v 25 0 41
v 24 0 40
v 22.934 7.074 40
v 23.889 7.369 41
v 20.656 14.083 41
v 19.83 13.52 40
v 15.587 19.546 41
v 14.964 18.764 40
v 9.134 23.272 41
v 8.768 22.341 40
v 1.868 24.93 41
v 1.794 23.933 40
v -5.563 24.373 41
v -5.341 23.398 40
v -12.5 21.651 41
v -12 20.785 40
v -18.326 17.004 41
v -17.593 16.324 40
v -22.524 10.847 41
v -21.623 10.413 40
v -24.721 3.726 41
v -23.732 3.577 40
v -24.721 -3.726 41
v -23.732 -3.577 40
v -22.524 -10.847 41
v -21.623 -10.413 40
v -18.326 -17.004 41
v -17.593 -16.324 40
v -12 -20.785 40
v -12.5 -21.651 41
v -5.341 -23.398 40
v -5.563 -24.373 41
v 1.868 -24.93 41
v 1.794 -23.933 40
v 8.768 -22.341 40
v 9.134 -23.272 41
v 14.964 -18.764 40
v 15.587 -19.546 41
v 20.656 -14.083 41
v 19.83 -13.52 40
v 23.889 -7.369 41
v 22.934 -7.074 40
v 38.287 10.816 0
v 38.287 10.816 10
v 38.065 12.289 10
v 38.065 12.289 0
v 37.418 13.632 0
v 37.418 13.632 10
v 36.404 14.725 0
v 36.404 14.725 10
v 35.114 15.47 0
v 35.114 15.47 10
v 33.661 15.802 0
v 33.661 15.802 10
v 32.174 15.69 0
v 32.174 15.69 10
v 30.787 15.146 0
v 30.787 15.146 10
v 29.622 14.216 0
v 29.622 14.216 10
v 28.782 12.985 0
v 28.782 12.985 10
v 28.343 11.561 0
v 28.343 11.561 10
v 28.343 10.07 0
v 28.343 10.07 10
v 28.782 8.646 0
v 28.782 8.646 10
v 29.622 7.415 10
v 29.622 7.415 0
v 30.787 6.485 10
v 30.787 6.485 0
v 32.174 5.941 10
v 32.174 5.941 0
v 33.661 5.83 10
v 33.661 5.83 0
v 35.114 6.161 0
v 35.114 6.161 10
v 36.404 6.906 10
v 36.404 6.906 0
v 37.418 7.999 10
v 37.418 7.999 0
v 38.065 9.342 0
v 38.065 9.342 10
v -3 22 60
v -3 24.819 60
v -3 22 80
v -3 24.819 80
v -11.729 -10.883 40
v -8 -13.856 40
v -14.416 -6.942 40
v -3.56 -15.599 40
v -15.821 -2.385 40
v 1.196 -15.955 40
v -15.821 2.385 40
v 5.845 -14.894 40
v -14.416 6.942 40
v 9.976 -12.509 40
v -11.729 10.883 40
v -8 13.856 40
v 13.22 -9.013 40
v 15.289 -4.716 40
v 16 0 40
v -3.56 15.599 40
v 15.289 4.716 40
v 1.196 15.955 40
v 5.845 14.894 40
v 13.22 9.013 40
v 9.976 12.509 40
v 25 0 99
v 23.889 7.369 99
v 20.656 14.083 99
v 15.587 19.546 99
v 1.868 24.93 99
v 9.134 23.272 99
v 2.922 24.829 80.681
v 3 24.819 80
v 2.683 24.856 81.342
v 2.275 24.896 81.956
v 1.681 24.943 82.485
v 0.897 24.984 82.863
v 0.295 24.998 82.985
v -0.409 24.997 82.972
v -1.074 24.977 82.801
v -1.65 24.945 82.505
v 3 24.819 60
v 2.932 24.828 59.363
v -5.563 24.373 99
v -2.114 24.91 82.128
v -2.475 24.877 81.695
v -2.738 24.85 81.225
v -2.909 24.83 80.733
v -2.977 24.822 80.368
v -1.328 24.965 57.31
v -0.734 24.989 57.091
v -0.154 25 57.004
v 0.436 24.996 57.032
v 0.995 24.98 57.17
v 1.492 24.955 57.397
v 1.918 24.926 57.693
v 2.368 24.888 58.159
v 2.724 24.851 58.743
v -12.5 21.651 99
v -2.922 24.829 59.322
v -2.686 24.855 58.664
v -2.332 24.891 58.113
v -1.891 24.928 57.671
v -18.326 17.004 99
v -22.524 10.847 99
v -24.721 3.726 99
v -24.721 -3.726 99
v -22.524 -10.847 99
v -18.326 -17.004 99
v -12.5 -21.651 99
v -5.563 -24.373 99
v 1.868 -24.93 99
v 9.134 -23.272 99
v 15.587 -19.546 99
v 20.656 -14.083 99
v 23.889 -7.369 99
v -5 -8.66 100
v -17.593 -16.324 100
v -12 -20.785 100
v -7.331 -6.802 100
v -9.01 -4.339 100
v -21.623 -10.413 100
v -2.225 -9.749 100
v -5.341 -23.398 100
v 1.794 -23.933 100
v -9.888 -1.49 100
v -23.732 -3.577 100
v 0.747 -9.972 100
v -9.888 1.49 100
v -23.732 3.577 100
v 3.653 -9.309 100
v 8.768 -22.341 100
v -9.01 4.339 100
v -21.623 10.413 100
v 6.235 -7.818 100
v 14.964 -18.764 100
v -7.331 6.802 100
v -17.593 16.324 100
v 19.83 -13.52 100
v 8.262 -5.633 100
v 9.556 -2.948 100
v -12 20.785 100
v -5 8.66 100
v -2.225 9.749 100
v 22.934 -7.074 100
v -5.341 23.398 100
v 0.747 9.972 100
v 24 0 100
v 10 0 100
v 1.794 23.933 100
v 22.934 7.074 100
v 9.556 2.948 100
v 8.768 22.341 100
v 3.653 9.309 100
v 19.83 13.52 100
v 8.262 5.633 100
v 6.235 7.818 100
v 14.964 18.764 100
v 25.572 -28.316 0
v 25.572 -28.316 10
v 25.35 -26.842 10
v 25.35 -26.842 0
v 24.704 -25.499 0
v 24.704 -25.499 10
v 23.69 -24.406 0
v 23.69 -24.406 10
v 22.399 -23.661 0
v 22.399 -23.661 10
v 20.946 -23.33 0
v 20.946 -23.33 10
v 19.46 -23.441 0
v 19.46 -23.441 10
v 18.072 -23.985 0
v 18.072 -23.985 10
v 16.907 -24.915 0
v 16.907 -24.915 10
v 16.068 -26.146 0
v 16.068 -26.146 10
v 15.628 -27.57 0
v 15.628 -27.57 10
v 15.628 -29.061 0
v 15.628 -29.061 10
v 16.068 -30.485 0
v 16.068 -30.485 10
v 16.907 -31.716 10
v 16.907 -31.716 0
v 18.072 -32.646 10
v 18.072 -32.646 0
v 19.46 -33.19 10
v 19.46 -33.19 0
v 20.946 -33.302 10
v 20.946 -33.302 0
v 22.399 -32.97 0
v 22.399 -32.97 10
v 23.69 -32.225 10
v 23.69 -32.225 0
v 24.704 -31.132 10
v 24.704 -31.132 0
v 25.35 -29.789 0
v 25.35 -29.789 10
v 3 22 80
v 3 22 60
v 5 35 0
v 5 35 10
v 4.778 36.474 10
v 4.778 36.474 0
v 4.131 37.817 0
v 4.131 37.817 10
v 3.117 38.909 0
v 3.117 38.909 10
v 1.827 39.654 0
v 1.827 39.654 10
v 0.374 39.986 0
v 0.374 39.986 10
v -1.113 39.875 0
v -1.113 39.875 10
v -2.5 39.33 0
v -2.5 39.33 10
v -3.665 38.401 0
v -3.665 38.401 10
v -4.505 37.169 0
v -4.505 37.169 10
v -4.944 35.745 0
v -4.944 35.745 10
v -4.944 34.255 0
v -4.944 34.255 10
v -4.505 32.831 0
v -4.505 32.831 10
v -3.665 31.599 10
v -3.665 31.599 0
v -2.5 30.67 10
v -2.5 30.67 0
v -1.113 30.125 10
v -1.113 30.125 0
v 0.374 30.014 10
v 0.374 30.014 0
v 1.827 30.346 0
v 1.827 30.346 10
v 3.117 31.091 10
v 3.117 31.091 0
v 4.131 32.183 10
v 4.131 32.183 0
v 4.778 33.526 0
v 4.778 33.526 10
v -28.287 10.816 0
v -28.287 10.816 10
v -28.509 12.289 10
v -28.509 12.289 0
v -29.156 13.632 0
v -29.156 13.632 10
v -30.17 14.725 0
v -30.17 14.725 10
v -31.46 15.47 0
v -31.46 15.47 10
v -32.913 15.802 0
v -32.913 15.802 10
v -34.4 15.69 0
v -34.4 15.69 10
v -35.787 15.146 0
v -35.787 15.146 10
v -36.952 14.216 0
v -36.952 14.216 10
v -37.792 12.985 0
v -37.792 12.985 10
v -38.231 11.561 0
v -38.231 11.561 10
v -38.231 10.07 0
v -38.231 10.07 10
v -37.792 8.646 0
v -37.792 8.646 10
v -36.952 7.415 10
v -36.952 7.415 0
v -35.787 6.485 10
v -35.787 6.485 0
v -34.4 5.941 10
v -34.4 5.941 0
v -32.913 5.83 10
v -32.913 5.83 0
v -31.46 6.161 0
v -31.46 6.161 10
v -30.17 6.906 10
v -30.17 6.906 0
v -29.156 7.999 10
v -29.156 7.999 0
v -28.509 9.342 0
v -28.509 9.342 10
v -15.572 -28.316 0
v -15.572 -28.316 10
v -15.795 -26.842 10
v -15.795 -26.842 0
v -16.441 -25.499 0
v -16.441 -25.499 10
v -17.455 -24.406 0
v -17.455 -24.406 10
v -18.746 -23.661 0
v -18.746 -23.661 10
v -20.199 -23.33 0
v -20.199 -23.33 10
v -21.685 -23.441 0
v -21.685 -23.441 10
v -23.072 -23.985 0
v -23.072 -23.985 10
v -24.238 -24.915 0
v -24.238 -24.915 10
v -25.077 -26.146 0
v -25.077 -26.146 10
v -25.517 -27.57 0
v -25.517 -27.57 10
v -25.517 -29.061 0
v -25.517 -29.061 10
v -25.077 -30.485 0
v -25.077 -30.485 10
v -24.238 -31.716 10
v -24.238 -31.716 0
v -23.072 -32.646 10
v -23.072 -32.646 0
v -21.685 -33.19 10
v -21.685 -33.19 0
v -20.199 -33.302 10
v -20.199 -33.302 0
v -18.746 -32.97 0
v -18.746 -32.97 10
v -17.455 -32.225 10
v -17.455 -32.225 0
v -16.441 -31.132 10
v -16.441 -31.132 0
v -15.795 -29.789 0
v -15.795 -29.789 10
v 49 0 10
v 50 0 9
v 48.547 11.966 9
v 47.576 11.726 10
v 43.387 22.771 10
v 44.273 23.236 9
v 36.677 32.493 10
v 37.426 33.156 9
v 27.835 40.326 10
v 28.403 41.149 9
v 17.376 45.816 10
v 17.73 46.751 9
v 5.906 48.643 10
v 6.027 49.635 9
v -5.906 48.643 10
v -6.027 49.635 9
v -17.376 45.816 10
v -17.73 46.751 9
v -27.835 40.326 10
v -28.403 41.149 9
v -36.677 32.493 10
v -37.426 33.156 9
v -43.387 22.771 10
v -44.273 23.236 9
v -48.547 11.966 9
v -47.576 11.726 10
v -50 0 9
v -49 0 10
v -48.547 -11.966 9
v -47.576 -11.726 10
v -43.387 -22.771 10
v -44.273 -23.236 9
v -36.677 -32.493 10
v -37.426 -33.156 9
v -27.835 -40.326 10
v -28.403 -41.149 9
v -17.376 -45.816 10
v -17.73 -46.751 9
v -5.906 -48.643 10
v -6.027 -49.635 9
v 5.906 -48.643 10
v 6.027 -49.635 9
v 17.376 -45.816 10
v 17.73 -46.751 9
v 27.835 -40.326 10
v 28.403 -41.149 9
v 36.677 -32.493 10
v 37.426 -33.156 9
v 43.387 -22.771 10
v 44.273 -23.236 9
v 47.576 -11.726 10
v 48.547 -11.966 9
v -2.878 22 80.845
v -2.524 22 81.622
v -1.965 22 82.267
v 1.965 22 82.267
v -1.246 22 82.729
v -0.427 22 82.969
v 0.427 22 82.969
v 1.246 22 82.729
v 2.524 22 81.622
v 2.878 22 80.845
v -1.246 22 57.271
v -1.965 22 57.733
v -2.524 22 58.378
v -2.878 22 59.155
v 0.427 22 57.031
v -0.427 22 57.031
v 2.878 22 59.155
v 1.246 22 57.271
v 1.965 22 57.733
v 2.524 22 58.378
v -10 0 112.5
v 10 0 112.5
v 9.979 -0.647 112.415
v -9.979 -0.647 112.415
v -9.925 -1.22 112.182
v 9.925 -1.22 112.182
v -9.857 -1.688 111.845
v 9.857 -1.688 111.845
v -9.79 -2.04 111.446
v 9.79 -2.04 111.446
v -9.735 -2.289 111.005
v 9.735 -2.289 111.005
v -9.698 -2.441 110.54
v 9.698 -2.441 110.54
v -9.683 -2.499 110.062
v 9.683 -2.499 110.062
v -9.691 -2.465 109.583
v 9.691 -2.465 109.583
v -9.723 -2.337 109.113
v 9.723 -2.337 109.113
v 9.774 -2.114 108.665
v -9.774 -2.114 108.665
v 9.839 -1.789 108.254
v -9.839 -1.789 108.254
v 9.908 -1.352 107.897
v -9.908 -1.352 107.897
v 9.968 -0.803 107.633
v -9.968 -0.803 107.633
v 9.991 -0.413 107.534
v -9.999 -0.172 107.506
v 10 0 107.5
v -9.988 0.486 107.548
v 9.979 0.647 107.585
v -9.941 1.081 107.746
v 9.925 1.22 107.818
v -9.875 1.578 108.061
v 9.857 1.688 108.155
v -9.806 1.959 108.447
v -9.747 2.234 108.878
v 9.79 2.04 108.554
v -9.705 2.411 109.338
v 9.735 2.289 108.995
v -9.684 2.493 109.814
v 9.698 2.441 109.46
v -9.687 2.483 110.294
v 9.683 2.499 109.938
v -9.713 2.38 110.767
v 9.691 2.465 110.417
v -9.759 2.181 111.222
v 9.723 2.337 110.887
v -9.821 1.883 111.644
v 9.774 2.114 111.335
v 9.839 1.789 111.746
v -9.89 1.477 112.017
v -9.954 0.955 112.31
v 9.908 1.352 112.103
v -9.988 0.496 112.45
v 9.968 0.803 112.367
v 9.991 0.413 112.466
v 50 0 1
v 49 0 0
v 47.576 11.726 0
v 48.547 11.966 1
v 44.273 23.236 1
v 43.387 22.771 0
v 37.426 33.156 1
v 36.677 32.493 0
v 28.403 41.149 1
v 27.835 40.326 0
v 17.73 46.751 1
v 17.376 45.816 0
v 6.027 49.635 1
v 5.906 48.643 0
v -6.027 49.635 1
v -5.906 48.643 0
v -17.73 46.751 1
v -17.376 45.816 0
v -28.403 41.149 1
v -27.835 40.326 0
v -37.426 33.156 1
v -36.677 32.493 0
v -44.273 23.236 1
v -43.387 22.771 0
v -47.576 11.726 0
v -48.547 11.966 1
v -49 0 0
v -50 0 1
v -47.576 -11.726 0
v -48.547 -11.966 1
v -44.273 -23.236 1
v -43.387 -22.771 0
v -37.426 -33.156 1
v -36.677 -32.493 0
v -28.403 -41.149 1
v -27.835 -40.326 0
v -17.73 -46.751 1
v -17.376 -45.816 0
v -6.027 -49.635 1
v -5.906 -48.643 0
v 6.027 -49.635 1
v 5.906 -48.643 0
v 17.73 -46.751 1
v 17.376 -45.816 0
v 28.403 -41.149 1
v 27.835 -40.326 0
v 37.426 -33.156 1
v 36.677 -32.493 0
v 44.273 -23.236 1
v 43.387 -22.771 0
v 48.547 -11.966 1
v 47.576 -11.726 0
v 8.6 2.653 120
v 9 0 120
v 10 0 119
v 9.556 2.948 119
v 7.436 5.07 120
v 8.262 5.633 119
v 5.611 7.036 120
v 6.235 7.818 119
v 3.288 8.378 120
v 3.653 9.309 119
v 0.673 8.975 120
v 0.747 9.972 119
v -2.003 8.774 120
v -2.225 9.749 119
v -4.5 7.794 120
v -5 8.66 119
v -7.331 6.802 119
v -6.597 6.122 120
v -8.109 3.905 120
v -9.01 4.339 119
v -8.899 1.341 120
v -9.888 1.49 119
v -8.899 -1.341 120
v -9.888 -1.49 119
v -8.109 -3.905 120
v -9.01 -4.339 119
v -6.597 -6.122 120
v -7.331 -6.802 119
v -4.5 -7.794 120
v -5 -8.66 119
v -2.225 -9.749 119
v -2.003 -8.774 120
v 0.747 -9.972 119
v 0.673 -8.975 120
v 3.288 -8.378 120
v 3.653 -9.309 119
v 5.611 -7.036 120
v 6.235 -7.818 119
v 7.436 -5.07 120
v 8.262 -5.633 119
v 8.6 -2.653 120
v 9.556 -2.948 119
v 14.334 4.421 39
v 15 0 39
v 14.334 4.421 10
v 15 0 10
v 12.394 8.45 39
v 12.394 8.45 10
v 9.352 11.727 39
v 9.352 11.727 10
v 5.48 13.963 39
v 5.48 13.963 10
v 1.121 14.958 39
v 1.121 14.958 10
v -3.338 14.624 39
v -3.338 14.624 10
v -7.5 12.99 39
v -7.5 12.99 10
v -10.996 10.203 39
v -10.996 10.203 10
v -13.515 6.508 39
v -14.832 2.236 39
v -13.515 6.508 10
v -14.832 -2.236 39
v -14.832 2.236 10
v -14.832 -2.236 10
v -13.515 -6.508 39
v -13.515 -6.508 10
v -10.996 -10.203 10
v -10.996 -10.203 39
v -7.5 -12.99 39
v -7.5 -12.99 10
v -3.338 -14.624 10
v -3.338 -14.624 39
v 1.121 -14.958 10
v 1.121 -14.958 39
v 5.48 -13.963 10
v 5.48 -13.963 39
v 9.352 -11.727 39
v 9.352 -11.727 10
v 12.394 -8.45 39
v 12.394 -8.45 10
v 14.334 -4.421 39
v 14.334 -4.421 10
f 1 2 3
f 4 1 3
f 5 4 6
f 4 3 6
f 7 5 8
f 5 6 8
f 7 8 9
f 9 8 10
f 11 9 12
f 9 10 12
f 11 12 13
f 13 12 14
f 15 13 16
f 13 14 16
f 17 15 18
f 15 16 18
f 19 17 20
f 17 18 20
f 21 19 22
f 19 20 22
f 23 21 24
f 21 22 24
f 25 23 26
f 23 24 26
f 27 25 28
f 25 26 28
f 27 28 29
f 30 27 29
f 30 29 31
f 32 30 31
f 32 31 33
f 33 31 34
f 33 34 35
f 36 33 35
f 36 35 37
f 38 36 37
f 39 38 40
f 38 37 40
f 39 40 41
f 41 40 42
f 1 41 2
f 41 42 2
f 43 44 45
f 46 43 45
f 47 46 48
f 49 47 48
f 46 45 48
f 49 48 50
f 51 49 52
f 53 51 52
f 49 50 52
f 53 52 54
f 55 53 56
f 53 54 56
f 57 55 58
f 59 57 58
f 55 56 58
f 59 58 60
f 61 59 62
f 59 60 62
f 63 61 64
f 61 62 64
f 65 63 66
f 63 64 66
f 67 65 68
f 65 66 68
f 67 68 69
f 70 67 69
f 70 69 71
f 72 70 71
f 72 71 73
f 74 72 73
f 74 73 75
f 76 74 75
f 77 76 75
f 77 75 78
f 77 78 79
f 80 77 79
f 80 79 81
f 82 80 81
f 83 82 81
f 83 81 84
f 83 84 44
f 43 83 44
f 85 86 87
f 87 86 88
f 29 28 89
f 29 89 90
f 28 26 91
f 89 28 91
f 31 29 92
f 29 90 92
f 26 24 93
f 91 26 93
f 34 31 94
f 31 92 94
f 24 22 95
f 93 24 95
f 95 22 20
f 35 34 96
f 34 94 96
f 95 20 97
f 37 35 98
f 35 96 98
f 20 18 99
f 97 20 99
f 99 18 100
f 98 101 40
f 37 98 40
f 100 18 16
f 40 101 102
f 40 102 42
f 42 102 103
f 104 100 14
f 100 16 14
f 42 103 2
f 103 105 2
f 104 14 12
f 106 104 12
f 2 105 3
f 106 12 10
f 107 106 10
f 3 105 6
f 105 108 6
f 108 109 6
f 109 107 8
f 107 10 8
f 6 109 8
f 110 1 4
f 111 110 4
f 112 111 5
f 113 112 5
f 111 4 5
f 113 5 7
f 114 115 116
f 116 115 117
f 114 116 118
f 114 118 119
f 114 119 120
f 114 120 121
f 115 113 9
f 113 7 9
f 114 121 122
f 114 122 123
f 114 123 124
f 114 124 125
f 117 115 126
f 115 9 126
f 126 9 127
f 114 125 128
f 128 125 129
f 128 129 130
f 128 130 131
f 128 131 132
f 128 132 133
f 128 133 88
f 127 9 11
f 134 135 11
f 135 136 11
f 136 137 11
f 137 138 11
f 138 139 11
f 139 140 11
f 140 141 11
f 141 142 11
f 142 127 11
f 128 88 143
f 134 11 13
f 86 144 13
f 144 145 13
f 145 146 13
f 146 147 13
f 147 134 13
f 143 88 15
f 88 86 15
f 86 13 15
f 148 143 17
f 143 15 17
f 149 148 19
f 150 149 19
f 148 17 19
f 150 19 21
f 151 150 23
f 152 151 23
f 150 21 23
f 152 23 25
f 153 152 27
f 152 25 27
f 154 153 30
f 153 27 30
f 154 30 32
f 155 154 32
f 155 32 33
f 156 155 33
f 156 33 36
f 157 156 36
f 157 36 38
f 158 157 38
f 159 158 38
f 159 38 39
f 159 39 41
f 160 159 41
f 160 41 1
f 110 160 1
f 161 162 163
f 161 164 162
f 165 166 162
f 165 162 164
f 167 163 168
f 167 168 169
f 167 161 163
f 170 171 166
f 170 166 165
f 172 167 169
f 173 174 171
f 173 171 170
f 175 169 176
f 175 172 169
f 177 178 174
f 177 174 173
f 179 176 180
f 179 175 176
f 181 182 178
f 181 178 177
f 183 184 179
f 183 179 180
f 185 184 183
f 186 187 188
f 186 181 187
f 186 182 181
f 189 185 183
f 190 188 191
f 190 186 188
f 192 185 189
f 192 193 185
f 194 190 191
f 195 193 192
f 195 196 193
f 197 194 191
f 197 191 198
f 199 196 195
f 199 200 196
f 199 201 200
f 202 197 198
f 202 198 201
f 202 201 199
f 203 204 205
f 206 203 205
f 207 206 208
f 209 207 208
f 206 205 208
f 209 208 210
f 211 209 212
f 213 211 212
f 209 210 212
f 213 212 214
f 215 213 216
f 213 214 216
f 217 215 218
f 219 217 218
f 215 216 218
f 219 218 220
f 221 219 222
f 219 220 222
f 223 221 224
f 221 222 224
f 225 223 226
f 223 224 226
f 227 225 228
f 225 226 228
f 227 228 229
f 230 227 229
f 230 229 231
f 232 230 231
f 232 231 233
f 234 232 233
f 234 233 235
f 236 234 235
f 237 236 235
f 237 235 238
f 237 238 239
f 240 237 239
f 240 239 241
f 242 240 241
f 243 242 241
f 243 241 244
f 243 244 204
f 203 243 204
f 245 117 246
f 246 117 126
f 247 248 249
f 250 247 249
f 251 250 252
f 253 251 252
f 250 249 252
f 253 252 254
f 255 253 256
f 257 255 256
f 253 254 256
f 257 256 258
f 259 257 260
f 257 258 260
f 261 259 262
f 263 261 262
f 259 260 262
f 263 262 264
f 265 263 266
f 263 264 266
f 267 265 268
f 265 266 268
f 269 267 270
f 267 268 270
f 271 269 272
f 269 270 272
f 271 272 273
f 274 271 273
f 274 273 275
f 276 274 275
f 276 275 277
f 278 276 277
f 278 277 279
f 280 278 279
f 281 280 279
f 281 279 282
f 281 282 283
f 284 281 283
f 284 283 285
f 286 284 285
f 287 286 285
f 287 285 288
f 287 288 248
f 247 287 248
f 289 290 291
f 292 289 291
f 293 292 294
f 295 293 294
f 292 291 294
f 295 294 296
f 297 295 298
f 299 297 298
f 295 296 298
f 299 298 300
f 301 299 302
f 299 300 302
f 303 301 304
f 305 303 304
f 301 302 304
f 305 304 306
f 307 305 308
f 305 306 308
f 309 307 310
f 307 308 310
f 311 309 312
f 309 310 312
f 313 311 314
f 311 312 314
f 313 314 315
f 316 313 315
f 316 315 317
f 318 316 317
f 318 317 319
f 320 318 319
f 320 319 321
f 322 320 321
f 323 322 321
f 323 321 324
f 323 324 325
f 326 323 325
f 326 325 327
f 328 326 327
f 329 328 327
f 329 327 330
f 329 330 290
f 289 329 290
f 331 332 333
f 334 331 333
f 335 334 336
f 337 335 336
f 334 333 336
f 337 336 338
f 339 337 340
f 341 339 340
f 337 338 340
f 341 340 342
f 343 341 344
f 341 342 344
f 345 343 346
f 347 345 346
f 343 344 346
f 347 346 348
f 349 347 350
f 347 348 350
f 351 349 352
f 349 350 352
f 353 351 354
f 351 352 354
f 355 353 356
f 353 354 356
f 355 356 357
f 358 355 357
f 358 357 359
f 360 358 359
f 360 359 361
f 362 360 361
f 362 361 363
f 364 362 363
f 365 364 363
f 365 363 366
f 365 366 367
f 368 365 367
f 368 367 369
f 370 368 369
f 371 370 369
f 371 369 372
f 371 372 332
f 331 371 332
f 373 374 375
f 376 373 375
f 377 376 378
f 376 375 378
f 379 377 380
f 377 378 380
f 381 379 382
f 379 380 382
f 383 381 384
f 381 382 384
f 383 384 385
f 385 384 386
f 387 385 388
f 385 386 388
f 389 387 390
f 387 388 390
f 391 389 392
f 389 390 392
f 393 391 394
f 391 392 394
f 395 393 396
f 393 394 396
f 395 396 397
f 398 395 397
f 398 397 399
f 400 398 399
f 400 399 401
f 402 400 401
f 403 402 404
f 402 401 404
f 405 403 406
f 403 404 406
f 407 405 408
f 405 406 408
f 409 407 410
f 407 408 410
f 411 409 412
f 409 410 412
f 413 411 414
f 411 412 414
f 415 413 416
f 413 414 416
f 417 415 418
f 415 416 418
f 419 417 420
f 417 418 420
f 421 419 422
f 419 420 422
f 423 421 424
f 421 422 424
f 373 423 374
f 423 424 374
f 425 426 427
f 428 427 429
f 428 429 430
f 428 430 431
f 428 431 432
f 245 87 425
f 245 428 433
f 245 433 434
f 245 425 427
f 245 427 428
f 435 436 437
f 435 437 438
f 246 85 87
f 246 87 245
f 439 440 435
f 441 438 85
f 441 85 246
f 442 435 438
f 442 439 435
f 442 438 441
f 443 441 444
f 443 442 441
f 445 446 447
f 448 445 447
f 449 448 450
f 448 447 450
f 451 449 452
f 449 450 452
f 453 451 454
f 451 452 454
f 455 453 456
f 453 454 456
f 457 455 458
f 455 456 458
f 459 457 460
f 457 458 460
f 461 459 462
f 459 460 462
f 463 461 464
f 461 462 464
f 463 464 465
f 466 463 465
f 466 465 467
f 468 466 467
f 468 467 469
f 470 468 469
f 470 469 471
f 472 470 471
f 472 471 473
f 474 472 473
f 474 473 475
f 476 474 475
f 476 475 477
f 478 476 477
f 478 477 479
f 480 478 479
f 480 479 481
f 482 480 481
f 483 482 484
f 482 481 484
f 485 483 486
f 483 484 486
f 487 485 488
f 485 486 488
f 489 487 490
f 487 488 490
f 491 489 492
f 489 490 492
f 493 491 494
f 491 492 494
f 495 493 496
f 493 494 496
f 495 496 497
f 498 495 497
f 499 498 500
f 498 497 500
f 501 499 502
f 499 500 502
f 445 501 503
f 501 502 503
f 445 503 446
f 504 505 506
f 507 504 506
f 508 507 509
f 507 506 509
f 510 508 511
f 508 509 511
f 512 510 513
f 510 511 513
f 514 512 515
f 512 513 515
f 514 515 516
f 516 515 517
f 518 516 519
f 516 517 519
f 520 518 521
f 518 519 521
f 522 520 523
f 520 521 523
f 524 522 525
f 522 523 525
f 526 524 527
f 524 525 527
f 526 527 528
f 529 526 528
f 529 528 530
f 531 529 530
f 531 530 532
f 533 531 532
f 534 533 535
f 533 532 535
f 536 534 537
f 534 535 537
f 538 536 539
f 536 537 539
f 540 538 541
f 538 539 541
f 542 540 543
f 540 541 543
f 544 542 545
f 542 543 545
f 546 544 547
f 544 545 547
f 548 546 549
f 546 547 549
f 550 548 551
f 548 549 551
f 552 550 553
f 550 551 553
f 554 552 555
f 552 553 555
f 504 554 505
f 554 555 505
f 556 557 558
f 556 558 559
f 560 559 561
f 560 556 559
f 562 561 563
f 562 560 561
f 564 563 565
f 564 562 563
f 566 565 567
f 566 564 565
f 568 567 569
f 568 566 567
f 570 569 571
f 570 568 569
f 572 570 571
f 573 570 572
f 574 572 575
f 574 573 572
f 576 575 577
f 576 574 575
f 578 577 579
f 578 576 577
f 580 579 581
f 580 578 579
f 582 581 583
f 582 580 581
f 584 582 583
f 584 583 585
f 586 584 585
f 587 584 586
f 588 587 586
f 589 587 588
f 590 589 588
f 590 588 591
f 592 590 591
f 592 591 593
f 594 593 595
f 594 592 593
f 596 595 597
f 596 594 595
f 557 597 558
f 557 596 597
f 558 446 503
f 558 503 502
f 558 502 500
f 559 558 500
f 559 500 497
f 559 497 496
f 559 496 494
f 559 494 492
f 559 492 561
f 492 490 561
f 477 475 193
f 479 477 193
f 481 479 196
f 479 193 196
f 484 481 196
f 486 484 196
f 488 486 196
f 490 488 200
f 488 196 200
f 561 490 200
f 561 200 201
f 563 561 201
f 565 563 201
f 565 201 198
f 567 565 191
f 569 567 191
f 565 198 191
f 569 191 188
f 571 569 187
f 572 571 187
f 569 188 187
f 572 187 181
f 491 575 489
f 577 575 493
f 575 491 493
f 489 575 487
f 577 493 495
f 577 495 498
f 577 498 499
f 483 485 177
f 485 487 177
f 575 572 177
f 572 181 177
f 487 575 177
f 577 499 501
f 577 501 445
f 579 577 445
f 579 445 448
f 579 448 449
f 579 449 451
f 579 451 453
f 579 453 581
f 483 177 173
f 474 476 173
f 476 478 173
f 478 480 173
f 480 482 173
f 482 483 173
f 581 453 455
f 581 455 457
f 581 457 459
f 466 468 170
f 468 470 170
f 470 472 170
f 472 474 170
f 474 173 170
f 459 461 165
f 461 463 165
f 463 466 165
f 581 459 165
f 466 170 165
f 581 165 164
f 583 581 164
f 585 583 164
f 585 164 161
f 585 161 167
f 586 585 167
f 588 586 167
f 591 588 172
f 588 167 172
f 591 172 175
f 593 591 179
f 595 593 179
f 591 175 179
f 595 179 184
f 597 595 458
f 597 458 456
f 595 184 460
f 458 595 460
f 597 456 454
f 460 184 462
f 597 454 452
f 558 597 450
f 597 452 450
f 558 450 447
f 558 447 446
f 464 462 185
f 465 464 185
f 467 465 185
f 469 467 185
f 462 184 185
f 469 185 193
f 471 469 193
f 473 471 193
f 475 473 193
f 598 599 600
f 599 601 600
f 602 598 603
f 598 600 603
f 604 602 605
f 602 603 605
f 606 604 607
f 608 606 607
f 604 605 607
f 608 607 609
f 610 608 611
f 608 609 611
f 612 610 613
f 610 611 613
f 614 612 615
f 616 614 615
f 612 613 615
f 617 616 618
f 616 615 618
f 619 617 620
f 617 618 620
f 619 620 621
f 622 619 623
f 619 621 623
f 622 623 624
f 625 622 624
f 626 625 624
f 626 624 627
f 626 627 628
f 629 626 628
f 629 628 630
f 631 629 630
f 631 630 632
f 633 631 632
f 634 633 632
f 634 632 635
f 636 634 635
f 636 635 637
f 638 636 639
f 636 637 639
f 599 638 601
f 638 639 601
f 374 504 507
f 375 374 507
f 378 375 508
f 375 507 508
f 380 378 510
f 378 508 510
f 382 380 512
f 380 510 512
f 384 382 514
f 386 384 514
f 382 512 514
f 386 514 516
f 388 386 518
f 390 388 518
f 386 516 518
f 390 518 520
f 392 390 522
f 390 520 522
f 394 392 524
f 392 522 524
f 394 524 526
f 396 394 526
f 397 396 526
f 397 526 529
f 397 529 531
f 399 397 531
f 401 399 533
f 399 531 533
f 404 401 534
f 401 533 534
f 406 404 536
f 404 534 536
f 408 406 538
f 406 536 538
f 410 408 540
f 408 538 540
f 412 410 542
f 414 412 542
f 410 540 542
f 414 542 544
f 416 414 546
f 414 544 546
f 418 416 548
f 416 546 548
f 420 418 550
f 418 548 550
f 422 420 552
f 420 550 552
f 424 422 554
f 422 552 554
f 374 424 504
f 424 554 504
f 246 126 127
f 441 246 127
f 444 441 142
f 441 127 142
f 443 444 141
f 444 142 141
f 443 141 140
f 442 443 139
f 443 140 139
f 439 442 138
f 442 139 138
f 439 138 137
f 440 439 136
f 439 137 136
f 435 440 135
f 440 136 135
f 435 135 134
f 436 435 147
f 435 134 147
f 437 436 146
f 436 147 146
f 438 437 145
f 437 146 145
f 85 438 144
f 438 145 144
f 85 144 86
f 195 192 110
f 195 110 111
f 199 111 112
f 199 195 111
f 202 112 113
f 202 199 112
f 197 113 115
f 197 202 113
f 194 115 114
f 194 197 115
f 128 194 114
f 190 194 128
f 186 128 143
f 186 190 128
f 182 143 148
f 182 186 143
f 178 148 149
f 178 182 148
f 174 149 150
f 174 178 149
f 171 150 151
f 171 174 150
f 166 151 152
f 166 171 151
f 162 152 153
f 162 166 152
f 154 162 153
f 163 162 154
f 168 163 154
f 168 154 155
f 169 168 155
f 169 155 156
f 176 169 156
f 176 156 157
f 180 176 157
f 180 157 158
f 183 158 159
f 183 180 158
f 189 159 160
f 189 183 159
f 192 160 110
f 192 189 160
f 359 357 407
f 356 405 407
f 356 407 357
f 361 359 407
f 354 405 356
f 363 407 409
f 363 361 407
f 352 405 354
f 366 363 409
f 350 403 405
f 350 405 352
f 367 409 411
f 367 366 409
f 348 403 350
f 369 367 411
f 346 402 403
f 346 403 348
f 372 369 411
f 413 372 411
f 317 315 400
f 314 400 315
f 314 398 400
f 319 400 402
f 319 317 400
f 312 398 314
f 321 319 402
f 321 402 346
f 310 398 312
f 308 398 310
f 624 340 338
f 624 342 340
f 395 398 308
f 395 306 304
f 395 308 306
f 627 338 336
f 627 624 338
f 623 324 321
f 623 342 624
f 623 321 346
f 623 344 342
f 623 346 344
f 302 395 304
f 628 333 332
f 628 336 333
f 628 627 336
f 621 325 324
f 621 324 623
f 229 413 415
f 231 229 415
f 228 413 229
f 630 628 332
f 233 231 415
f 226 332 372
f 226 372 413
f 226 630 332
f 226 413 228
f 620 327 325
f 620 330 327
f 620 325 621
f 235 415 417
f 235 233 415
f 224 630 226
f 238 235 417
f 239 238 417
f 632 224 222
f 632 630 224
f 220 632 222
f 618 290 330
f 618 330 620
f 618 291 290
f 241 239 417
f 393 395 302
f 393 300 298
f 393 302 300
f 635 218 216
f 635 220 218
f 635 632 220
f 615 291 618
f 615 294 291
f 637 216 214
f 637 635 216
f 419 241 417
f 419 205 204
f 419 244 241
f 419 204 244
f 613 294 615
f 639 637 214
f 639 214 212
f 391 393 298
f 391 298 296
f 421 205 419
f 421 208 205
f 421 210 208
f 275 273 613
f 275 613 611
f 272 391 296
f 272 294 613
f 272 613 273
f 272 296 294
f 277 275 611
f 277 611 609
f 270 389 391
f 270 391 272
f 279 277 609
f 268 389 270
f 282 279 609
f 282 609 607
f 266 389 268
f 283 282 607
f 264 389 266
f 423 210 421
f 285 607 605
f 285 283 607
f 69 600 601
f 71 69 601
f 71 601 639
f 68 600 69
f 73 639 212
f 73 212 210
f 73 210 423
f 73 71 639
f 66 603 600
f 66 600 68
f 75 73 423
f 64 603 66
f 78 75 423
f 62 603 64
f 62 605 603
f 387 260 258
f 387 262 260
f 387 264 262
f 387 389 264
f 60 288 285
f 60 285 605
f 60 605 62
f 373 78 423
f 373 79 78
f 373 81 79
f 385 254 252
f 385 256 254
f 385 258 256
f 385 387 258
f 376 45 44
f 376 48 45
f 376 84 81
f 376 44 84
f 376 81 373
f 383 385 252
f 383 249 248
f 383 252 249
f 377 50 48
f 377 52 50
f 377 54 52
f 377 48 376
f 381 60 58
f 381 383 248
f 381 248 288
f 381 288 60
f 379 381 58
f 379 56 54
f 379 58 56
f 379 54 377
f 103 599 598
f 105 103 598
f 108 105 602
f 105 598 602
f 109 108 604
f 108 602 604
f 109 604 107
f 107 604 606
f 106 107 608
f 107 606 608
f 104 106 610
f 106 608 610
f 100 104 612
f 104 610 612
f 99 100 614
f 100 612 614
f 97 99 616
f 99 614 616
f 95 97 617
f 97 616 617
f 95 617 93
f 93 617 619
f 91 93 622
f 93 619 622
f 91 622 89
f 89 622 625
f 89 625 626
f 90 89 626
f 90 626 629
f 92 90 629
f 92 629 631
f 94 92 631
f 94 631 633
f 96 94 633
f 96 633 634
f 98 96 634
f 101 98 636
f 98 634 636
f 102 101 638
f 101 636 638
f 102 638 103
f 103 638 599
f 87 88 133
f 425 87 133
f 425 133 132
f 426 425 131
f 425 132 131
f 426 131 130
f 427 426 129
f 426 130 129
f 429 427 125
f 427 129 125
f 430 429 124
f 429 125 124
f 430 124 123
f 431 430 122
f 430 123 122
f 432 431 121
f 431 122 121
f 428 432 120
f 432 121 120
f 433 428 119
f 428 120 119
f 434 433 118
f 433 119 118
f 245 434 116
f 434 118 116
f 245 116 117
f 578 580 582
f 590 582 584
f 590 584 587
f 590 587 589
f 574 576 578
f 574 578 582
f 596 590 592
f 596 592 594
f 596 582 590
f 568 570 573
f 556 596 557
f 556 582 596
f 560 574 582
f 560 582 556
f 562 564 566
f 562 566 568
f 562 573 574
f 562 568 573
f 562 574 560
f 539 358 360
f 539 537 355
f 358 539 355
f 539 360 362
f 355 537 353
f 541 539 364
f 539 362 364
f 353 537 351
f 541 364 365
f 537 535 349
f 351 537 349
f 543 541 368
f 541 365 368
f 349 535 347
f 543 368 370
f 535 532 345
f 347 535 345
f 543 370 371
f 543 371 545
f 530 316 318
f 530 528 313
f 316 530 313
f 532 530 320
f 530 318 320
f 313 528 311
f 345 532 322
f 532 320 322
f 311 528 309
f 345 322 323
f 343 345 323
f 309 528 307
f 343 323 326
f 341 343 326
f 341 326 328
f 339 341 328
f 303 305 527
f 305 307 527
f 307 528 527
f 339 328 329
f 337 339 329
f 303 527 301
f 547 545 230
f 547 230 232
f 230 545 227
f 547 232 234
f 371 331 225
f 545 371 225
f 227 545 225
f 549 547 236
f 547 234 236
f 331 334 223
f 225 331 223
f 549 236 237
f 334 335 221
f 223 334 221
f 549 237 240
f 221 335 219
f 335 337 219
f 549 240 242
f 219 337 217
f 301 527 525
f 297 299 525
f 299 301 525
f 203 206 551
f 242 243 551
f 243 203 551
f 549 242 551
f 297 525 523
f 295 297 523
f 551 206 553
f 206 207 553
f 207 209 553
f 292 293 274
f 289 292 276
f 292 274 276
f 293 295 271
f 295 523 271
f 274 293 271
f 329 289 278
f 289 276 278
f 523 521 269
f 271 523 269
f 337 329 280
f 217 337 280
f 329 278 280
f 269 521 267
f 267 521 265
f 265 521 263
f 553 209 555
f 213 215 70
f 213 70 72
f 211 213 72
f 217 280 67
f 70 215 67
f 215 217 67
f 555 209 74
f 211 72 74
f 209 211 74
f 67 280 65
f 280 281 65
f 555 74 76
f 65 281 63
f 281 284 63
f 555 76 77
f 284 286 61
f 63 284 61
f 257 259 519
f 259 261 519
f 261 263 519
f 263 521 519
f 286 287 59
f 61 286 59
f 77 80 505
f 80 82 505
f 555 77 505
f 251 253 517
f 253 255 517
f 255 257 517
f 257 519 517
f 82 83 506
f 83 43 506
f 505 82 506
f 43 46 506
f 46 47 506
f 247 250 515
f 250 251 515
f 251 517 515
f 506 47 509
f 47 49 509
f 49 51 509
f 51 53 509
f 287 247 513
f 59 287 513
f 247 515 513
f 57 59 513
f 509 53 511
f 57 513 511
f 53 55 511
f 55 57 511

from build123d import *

# Parameters (mm, degrees)
SKETCH_1_R              = 50
EXTRUDE_1_DEPTH         = 10
SKETCH_2_R              = 15
EXTRUDE_2_DEPTH         = 28
SKETCH_3_R              = 16
EXTRUDE_3_DEPTH         = 2
SKETCH_4_R              = 25
EXTRUDE_4_DEPTH         = 60
SKETCH_5_R              = 10
EXTRUDE_5_DEPTH         = 20
CHAMFER_1_SIZE          = 1
HOLE_WIZARD_10_0_10_1_D = 10
CUT_EXTRUDE_1_DEPTH     = 3
HOLE_WIZARD_5_0_5_1_D   = 5


# Read off the part's stored shape, not the designer's step: 구배27
with BuildPart() as part:
    # 스케치1 → 보스-돌출1 (new body)
    with BuildSketch(Plane.XY):
        Circle(SKETCH_1_R)
    extrude(amount=EXTRUDE_1_DEPTH)

    # 스케치2 → 보스-돌출2 (add)
    with BuildSketch(Plane.XY.offset(10)):
        Circle(SKETCH_2_R)
    extrude(amount=EXTRUDE_2_DEPTH)

    # 스케치3 → 보스-돌출3 (add)
    with BuildSketch(Plane.XY.offset(38)):
        Circle(SKETCH_3_R)
    extrude(amount=EXTRUDE_3_DEPTH)

    # 스케치4 → 보스-돌출4 (add)
    with BuildSketch(Plane.XY.offset(40)):
        Circle(SKETCH_4_R)
    extrude(amount=EXTRUDE_4_DEPTH)

    # 스케치5 → 보스-돌출5 (add)
    with BuildSketch(Plane.XY.offset(100)):
        Circle(SKETCH_5_R)
    extrude(amount=EXTRUDE_5_DEPTH)

    # 모따기1
    chamfer_1_edges = [part.edges().sort_by_distance(p)[0] for p in [
        (-25, 0, 40),
        (-25, 0, 100),
        (-50, 0, 0),
        (-10, 0, 120),
        (-50, 0, 10),
    ]]
    chamfer(chamfer_1_edges, length=CHAMFER_1_SIZE)

    # 구배27 outline → 구배27 (revolve, cut)
    with BuildSketch(Plane.XZ):
        Polygon((16, 40), (15, 39), (15, 38), (16, 38), align=None)
    revolve(axis=Axis((0, 0, 0), (0, 0, 1)), mode=Mode.SUBTRACT)

    # Ø10.0 (10) 지름 구멍1 (through all)
    with Locations(Plane(origin=(0, 0, 0), x_dir=(-1, 0, 0), z_dir=(0, 0, -1))):
        with Locations((0, 35), (-33.28697807, 10.815594803), (-20.57248383, -28.315594803), (20.57248383, -28.315594803), (33.28697807, 10.815594803)):
            Hole(HOLE_WIZARD_10_0_10_1_D / 2)

    # 스케치17 → 컷-돌출1 (cut)
    with BuildSketch(Plane(origin=(0, 25, 0), x_dir=(1, 0, 0), z_dir=(0, 1, 0))):
        with BuildLine():
            Line((-3, -60), (-3, -80))
            ThreePointArc((-3, -80), (0, -83), (3, -80))
            Line((3, -80), (3, -60))
            ThreePointArc((3, -60), (0, -57), (-3, -60))
        make_face()
    extrude(amount=-CUT_EXTRUDE_1_DEPTH, mode=Mode.SUBTRACT)

    # Ø5.0 (5) 지름 구멍1 (through all)
    with Locations(Plane(origin=(-10, 0, 0), x_dir=(0, 0, -1), z_dir=(-1, 0, 0))):
        with Locations((-110, 0)):
            Hole(HOLE_WIZARD_5_0_5_1_D / 2)


solid = part.part
